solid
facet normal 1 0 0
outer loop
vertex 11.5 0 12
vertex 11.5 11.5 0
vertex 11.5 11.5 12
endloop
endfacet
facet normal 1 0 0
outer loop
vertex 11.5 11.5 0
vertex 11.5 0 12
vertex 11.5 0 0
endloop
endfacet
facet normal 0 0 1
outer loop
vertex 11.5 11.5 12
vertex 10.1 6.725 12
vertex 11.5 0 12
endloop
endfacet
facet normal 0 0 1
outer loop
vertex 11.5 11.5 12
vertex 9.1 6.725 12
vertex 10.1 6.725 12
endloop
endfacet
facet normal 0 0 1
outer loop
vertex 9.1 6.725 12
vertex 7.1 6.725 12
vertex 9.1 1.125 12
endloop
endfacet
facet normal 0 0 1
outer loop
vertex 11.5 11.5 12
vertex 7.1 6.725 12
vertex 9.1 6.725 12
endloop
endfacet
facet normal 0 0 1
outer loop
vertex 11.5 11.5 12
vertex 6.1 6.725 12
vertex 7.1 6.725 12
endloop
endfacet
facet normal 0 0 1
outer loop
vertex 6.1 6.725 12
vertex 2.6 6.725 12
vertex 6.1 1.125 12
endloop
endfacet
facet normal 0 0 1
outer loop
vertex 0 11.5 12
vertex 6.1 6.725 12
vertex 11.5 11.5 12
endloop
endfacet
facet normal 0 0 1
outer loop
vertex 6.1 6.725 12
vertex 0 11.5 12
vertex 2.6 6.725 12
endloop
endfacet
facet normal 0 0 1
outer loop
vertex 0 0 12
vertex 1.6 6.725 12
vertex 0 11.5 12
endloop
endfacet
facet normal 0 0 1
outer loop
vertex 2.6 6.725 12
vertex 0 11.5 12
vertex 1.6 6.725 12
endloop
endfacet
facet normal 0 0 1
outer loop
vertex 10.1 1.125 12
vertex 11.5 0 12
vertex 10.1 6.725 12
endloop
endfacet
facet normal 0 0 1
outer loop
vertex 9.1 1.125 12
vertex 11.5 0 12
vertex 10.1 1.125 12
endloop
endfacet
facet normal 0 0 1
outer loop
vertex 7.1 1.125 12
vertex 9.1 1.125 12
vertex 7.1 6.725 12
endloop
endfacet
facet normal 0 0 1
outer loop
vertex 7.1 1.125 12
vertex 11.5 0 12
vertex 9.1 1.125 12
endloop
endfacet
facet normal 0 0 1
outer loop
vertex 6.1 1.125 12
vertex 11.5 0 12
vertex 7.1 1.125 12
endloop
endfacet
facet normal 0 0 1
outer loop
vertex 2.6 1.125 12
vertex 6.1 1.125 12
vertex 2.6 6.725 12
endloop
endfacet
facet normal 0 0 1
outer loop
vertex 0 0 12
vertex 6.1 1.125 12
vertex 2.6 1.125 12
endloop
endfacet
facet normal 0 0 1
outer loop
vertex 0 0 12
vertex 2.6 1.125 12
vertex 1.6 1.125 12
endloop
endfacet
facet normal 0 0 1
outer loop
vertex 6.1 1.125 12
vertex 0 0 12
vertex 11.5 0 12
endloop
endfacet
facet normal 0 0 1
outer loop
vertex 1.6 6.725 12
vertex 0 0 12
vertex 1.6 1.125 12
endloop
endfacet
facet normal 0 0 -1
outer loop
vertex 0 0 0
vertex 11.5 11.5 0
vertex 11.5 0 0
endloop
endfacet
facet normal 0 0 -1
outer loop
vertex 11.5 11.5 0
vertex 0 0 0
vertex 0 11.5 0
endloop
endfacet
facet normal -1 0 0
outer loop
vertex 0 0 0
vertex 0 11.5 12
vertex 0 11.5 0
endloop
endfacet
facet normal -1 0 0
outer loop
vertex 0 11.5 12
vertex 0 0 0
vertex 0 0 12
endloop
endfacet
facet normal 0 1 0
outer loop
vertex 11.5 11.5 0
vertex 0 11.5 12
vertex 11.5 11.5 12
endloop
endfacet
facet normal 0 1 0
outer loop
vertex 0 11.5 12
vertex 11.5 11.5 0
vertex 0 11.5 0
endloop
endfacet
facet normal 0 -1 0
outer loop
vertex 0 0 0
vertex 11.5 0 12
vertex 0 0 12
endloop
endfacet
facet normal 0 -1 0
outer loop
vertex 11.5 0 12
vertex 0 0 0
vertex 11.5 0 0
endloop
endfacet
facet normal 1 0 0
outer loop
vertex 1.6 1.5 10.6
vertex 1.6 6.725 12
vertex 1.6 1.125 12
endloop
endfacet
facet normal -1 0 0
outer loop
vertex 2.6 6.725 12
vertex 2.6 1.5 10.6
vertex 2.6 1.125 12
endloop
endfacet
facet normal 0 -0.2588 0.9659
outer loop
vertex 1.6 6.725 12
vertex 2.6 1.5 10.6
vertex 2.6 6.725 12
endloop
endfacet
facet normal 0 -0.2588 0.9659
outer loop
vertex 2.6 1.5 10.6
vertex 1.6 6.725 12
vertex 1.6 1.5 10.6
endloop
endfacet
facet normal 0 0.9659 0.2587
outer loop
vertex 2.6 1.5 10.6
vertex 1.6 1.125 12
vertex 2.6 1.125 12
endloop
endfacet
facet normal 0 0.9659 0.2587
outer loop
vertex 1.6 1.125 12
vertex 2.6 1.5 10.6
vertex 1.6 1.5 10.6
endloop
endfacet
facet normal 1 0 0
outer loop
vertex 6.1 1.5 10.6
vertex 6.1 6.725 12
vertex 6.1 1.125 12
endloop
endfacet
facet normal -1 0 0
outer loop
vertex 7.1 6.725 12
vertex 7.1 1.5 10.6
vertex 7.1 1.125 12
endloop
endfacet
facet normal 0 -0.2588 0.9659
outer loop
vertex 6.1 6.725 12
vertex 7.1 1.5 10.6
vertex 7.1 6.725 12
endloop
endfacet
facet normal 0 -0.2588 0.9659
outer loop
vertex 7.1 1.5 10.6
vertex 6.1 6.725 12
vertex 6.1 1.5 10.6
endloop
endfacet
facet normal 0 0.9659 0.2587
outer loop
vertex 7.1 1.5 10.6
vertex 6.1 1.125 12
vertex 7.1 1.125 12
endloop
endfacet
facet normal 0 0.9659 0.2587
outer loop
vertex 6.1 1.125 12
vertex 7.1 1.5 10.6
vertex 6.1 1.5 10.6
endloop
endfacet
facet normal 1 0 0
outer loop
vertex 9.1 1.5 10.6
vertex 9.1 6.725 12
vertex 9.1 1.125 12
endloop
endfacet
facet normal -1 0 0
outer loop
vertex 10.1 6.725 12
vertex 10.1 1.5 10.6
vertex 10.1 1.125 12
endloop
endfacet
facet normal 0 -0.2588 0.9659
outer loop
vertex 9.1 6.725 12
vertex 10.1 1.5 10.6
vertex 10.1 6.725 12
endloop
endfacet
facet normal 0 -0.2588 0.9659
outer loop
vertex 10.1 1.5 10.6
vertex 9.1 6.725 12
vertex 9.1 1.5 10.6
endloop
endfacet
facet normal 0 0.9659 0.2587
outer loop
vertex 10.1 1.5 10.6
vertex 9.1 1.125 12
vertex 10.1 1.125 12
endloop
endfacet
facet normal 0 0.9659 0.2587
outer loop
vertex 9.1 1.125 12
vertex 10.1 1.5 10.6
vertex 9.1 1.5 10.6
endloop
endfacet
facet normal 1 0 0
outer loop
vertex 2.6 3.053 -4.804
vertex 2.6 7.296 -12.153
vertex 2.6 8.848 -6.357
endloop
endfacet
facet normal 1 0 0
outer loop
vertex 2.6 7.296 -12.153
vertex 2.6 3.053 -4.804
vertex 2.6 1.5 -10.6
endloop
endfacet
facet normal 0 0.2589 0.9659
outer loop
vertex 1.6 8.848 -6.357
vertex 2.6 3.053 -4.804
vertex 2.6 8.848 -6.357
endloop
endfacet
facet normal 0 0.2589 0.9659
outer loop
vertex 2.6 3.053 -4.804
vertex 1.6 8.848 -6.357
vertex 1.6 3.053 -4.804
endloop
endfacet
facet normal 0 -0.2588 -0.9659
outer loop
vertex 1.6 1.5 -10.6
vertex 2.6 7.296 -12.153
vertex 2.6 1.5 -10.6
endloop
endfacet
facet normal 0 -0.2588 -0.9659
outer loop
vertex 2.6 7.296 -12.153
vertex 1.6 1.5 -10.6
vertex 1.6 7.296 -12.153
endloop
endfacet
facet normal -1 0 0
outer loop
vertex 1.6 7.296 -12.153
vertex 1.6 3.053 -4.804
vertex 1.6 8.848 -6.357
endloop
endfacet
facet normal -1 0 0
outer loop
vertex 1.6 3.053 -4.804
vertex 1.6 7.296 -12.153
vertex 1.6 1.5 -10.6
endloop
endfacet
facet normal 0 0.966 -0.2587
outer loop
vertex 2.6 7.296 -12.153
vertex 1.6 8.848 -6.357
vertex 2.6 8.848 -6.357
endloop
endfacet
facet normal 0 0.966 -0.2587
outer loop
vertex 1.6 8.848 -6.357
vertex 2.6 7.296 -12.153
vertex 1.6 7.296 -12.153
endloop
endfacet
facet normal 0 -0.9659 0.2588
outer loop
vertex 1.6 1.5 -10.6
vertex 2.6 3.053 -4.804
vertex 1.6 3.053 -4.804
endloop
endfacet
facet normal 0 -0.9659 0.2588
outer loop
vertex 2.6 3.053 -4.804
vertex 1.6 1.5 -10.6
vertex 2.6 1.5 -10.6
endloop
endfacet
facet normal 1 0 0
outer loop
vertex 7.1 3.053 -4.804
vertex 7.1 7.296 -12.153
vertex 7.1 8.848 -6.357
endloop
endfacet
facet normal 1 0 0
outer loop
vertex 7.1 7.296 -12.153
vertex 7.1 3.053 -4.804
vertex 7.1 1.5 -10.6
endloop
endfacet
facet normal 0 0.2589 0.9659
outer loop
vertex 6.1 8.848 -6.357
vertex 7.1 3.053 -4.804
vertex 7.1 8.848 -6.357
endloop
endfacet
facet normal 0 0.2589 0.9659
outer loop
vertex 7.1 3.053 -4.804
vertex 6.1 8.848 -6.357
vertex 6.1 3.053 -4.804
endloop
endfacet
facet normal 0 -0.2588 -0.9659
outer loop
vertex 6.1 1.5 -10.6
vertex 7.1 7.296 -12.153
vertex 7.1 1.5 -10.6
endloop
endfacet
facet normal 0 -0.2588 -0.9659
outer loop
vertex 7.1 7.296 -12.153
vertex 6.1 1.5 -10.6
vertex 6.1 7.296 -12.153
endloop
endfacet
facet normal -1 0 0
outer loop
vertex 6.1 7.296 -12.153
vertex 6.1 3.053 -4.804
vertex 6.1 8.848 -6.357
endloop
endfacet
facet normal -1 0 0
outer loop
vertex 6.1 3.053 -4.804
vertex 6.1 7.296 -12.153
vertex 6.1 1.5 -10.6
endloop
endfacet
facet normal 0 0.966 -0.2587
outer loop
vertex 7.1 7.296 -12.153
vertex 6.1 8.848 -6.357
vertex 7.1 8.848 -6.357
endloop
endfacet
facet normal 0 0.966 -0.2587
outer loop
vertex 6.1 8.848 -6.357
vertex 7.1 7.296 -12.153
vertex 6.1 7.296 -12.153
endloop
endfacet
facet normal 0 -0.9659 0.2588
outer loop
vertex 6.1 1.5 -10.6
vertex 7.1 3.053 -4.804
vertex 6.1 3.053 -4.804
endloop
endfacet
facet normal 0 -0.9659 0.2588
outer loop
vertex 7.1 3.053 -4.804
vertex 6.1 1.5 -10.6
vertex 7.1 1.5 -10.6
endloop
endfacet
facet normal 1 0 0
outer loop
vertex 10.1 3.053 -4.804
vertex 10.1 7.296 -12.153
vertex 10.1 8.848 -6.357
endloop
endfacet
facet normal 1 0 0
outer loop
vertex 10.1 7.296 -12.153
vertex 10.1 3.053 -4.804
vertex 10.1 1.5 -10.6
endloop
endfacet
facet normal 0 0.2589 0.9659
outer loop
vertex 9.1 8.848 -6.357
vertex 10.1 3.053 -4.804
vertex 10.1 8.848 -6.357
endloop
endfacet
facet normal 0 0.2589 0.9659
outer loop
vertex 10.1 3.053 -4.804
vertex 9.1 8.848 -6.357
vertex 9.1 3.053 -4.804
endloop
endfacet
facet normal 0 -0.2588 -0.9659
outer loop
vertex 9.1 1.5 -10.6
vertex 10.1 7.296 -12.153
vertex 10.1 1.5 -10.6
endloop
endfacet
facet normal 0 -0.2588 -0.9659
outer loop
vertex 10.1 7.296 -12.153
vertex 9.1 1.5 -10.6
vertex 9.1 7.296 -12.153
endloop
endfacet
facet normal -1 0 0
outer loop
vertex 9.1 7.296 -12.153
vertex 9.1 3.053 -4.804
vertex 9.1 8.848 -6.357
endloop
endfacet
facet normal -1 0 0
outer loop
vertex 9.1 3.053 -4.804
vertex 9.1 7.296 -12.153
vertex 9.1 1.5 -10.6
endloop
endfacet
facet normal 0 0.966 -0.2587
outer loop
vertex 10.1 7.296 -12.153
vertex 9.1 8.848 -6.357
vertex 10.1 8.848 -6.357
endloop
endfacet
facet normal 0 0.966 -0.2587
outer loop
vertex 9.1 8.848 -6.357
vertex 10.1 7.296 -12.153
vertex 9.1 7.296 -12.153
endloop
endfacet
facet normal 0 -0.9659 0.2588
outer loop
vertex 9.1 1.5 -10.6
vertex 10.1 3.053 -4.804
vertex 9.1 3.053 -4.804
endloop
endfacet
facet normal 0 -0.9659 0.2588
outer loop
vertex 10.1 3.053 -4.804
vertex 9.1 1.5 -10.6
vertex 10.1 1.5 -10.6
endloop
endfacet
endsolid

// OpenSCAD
module _inner_upper_holder(space) {
    translate([space,1.5,10.6]) {
        rotate([15,0,0]) {
            cube([1, 6, 6]);
        }
    }
}

module _inner_lower_holder(space) {
    translate([space,1.5,-10.6]) {
        rotate([-15,0,0]) {
            cube([1, 6, 6]);
        }
    }
}


module dripsystem_dripper_neg() {
    difference() {
        cube([11.5, 11.5,12]);
        _inner_upper_holder(1.6);
        _inner_upper_holder(6.1);
        _inner_upper_holder(9.1);

    }

        _inner_lower_holder(1.6);
        _inner_lower_holder(6.1);
        _inner_lower_holder(9.1);


}

dripsystem_dripper_neg();
